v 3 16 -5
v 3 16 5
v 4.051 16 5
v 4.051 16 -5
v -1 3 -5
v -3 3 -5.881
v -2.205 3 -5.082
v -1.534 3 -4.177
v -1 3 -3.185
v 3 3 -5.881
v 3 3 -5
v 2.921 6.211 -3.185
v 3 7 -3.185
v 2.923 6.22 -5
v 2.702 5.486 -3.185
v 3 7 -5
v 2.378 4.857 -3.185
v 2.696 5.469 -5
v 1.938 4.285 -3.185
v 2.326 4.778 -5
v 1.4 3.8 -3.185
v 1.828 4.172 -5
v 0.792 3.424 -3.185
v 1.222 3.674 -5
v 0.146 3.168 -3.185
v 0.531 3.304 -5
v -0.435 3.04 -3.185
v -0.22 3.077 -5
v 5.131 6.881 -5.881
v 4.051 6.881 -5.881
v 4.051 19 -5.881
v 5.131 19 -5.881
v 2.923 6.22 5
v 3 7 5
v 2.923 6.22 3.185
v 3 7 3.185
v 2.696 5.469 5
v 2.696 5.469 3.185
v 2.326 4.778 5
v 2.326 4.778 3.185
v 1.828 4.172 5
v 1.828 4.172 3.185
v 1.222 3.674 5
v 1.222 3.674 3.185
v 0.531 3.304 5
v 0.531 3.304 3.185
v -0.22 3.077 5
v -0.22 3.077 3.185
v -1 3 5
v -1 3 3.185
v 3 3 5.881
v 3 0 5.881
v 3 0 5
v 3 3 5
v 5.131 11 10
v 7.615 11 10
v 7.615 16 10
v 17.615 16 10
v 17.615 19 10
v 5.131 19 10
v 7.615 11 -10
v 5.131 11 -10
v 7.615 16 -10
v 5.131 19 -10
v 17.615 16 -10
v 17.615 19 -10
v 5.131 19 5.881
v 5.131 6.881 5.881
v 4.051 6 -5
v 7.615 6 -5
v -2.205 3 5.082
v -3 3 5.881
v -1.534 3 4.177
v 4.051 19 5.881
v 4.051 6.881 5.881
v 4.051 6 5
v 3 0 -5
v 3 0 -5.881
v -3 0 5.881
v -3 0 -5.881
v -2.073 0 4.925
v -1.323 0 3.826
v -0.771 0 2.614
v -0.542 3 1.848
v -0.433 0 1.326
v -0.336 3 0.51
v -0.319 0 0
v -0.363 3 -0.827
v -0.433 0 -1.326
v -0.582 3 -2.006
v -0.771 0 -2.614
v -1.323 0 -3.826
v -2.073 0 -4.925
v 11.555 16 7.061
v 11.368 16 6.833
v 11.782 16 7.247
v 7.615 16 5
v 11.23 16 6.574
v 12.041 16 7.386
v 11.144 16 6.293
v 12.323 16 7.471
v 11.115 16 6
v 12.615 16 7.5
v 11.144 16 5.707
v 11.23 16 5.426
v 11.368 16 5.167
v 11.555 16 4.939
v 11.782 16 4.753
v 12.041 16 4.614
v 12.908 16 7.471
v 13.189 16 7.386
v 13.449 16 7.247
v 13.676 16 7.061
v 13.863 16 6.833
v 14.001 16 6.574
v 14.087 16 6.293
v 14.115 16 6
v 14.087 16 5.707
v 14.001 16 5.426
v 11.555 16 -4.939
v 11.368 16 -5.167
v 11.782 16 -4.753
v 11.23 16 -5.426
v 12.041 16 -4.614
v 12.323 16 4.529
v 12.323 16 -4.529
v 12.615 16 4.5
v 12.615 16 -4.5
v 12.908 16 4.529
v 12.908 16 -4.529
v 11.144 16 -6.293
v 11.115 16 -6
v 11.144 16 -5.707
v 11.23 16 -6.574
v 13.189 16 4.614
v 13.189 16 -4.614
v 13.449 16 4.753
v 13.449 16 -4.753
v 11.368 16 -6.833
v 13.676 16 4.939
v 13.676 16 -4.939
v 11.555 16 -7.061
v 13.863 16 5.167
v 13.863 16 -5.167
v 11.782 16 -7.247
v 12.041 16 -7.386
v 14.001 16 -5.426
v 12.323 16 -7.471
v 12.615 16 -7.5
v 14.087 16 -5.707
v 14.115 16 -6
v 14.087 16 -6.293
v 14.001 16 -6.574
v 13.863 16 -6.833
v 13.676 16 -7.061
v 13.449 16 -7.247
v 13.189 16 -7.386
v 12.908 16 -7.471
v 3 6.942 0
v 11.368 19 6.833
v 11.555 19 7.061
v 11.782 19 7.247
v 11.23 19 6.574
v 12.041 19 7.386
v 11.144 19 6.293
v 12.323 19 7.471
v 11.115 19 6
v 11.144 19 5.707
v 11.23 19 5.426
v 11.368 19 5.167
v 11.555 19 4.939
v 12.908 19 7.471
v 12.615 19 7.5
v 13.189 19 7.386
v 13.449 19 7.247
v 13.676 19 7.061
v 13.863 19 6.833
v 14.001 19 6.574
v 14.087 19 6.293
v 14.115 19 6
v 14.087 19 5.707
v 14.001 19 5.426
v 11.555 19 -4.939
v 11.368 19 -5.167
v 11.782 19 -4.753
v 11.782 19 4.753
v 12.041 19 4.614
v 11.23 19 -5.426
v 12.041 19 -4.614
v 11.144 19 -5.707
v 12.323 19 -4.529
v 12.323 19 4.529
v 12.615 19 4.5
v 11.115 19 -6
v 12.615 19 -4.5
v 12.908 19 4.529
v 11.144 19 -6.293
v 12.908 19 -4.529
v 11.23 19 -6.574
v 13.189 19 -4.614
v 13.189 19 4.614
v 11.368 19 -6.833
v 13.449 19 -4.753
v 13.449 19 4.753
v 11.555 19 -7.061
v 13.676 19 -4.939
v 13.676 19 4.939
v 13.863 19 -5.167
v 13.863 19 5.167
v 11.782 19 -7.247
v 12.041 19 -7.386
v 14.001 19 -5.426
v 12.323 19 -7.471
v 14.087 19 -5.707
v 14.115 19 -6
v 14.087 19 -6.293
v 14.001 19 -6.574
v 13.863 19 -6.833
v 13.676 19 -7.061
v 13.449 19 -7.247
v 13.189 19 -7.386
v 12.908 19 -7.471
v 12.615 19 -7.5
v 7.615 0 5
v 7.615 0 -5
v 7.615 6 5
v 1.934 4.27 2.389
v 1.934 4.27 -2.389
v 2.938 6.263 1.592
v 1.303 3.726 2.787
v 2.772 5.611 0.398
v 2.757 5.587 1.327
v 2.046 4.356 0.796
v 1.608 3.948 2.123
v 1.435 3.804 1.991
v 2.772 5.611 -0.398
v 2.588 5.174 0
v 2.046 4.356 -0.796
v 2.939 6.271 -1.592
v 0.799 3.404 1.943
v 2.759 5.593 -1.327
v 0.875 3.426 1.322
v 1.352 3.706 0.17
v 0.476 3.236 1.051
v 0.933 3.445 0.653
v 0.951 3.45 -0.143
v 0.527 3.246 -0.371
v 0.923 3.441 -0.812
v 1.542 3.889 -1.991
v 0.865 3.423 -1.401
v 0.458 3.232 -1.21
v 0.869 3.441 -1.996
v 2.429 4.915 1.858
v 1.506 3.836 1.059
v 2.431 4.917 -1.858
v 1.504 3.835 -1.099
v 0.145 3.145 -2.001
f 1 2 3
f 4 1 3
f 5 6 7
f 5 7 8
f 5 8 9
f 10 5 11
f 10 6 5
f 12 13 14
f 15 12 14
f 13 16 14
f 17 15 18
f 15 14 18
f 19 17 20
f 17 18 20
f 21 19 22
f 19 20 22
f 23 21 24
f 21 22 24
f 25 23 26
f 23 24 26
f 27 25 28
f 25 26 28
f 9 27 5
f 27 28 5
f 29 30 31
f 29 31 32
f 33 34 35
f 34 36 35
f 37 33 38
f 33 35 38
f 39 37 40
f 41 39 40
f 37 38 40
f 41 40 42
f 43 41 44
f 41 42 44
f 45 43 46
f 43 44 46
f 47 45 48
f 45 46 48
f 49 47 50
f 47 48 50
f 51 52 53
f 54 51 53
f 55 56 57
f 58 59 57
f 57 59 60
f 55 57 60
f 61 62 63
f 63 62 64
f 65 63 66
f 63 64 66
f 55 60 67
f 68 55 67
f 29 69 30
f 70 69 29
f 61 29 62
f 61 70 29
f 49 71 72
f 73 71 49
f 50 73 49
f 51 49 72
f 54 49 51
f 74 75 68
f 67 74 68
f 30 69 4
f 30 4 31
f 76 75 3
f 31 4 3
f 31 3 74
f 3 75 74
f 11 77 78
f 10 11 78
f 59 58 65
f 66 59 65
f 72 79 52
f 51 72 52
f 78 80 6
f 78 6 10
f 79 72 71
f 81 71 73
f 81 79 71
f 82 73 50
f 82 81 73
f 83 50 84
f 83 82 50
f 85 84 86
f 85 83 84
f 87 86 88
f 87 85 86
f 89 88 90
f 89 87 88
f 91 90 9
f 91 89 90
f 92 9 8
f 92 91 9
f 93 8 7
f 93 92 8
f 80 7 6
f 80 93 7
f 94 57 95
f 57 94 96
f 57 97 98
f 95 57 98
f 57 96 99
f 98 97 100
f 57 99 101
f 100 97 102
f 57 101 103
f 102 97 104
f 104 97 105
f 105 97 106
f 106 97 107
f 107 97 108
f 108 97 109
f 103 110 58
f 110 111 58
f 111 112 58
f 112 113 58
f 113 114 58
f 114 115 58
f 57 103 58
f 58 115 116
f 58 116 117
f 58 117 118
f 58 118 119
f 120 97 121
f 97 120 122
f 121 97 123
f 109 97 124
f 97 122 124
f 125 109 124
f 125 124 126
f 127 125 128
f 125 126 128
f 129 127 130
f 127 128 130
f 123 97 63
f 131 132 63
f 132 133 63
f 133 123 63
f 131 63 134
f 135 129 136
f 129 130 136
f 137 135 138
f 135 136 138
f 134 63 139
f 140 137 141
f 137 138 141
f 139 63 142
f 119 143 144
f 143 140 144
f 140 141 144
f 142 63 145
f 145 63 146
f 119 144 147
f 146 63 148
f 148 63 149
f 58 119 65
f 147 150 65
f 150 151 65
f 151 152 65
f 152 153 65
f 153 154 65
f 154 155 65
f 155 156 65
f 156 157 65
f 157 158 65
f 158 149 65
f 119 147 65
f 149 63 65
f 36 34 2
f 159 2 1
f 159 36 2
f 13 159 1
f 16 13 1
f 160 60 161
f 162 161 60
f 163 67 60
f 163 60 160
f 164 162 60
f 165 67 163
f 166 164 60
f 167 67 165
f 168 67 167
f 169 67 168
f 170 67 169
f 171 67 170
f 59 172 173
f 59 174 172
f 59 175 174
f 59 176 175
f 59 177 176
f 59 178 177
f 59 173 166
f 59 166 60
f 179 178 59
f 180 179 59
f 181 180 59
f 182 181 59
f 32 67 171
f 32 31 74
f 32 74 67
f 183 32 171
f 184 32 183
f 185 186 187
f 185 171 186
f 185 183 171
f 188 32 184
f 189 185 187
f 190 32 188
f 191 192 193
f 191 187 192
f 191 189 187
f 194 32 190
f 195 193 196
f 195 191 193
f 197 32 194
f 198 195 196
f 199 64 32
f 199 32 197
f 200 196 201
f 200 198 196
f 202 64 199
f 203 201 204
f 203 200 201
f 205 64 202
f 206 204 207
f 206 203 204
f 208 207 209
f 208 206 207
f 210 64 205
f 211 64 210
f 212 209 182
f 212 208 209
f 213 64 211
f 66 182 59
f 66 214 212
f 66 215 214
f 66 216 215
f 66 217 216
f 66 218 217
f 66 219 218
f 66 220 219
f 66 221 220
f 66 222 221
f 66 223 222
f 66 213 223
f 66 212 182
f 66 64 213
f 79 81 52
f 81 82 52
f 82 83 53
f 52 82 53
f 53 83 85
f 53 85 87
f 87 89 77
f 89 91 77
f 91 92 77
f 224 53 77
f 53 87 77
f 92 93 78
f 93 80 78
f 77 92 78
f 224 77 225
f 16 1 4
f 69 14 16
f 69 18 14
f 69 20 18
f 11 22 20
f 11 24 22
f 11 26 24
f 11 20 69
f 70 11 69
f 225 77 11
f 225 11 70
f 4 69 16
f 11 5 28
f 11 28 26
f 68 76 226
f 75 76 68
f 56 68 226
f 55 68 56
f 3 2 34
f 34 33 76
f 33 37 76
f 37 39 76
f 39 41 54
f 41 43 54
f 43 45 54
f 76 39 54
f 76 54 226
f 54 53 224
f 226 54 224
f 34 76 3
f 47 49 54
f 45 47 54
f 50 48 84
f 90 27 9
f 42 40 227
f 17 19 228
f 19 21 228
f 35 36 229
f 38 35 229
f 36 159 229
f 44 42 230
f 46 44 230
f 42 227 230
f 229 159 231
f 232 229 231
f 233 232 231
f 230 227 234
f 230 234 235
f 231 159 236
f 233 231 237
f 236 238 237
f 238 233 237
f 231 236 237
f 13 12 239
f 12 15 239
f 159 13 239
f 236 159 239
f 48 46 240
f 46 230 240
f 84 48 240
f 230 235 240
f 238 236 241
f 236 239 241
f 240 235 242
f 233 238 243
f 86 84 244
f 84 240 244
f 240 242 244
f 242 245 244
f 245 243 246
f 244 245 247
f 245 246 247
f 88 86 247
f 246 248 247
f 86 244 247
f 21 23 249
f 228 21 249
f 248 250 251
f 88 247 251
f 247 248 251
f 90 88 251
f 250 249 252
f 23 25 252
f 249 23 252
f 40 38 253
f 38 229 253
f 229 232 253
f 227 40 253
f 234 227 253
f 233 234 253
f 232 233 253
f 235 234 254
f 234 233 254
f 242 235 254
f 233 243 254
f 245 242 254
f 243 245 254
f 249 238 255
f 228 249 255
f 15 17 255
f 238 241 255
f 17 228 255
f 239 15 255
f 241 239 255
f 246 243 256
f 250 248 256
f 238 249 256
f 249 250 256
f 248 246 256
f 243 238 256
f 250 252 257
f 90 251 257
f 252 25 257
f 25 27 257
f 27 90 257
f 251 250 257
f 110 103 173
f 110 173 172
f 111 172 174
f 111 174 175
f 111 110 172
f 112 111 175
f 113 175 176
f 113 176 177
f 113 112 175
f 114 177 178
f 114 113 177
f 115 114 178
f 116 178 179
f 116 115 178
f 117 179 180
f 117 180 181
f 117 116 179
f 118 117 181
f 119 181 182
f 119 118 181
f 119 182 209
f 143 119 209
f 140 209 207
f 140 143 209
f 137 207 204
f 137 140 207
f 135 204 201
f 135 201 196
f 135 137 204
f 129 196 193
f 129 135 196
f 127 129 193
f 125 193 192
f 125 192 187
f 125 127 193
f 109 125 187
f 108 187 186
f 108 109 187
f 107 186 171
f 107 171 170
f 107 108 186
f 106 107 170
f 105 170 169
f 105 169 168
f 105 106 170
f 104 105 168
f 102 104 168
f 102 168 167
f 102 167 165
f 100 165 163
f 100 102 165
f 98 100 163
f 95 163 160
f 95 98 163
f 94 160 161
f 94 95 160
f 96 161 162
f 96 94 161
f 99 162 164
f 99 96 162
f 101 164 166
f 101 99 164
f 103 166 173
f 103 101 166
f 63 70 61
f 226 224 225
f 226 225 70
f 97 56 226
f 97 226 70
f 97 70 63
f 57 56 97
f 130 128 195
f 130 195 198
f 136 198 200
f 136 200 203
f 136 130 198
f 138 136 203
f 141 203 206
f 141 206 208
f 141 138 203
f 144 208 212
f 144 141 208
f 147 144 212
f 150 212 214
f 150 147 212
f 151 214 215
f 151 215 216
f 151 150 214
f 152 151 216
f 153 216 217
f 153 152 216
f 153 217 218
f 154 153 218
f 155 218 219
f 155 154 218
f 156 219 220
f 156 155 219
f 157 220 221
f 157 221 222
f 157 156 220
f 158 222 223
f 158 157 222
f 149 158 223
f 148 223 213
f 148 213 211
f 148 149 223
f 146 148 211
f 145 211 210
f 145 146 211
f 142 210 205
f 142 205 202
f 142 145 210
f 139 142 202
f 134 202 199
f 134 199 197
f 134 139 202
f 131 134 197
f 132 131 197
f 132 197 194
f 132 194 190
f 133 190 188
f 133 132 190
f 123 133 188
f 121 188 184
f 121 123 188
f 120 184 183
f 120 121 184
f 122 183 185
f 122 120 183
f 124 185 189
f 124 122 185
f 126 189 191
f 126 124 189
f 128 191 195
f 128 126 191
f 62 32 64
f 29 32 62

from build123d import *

# Parameters (mm, degrees)
SKETCH1_R               = 1.5
BOSS_EXTRUDE1_DEPTH     = 3
SKETCH3_W               = 4.615398666
SKETCH3_H               = 10
BOSS_EXTRUDE2_DEPTH     = 12.9997796
FILLET7_R               = 1
CUT_EXTRUDE4_DEPTH      = 10
SKETCH9_W               = 13.564457496
SKETCH9_H               = 20
SKETCH9_R               = 1.5
BOSS_EXTRUDE3_DEPTH     = 3
CHAMFER1_SIZE           = 10
CHAMFER2_SIZE           = 10
FILLET8_R               = 4
CUT_EXTRUDE5_DEPTH      = 27.355587635
CUT_EXTRUDE5_DEPTH_BACK = 27.355587635
SKETCH10_W              = 8.131195533
SKETCH10_H              = 6.749631571
SKETCH10_H_2            = 7.013496214


with BuildPart() as part:
    # Sketch1 → Boss-Extrude1 (new body)
    with BuildSketch(Plane(origin=(0, 0, 0), x_dir=(1, 0, 0), z_dir=(0, 1, 0))):
        Polygon((-3, -11.32792047), (3, -11.32792047), (3, -5), (7.615398666, -5), (7.615398666, 5), (3, 5), (3, 11.32792047), (-3, 11.32792047), align=None)
        with Locations(Location((0, 8.5, 0), (0, 0, 270))):
            Circle(SKETCH1_R, mode=Mode.SUBTRACT)
        with Locations(Location((0, -8.5, 0), (0, 0, 270))):
            Circle(SKETCH1_R, mode=Mode.SUBTRACT)
    extrude(amount=BOSS_EXTRUDE1_DEPTH)

    # Sketch3 → Boss-Extrude2 (add)
    with BuildSketch(Plane(origin=(0, 3, 0), x_dir=(1, 0, 0), z_dir=(0, 1, 0))):
        with Locations((5.307699333, 0)):
            Rectangle(SKETCH3_W, SKETCH3_H)
    extrude(amount=BOSS_EXTRUDE2_DEPTH)

    # Fillet7
    fillet7_edges = [part.edges().sort_by_distance(p)[0] for p in [
        (3, 1.5, 11.32792047),
        (3, 1.5, -11.32792047),
    ]]
    fillet(fillet7_edges, radius=FILLET7_R)

    # Sketch7 → Cut-Extrude4 (cut)
    with BuildSketch(Plane.XZ):
        with BuildLine():
            Line((-3.65526474, -6.392053518), (-3.78188192, 6.478485425))
            ThreePointArc((-3.78188192, 6.478485425), (-0.319780446, 0.076652438), (-3.65526474, -6.392053518))
        make_face()
    extrude(amount=-CUT_EXTRUDE4_DEPTH, mode=Mode.SUBTRACT)

    # Sketch9 → Boss-Extrude3 (add)
    with BuildSketch(Plane(origin=(0, 15.9997796, 0), x_dir=(1, 0, 0), z_dir=(0, 1, 0))):
        with Locations((10.833169918, 0)):
            Rectangle(SKETCH9_W, SKETCH9_H)
        with Locations(Location((12.615398666, 6, 0), (0, 0, 270))):
            Circle(SKETCH9_R, mode=Mode.SUBTRACT)
        with Locations(Location((12.615398666, -6, 0), (0, 0, 270))):
            Circle(SKETCH9_R, mode=Mode.SUBTRACT)
    extrude(amount=BOSS_EXTRUDE3_DEPTH)

    # Chamfer1
    # the kernel refuses this chamfer: 10 mm, written as the material it adds along each edge
    with BuildSketch(Plane(origin=(4.05094117, 15.9997796, 5), x_dir=(0, -0.9996219169112968, -0.027495876610586403), z_dir=(1, 0, 0))) as chamfer1_piece_1_section:
        Polygon((CHAMFER1_SIZE * 0.999621916911, -CHAMFER1_SIZE * 0.0274958766106), (-CHAMFER1_SIZE * 0.0274958766106, -CHAMFER1_SIZE * 0.999621916911), (0, 0), align=None)
    chamfer1_piece_1 = extrude(amount=3.564457497, mode=Mode.PRIVATE)
    chamfer1_piece_1 = split(chamfer1_piece_1, bisect_by=Plane(origin=(5.833169918, 12.110890711, 10), z_dir=(0, 0, -1)), keep=Keep.TOP, mode=Mode.PRIVATE)
    add(chamfer1_piece_1)

    # Chamfer2
    # the kernel refuses this chamfer: 10 mm, written as the material it adds along each edge
    with BuildSketch(Plane(origin=(7.615398666, 15.9997796, -5), x_dir=(0, -0.9996219169112968, 0.027495876610586403), z_dir=(-1, 0, 0))) as chamfer2_piece_1_section:
        Polygon((CHAMFER2_SIZE * 0.999621916911, -CHAMFER2_SIZE * 0.0274958766106), (-CHAMFER2_SIZE * 0.0274958766106, -CHAMFER2_SIZE * 0.999621916911), (0, 0), align=None)
    chamfer2_piece_1 = extrude(amount=3.564457497, mode=Mode.PRIVATE)
    chamfer2_piece_1 = split(chamfer2_piece_1, bisect_by=Plane(origin=(5.833169918, 12.110890711, -10), z_dir=(0, 0, 1)), keep=Keep.TOP, mode=Mode.PRIVATE)
    add(chamfer2_piece_1)

    # Fillet8
    fillet8_edges = [part.edges().sort_by_distance(p)[0] for p in [
        (3, 3, 0),
    ]]
    fillet(fillet8_edges, radius=FILLET8_R)

    # Sketch10 → Cut-Extrude5 (cut, two sides: drawn at the far end of the back side and taken through both)
    with BuildSketch(Plane(origin=(0, 3, 0), x_dir=(1, 0, 0), z_dir=(0, 1, 0)).offset(-CUT_EXTRUDE5_DEPTH_BACK)):
        with Locations((1.065597767, 9.256059268)):
            Rectangle(SKETCH10_W, SKETCH10_H)
        with Locations((1.065597767, -9.38799159)):
            Rectangle(SKETCH10_W, SKETCH10_H_2)
    extrude(amount=CUT_EXTRUDE5_DEPTH + CUT_EXTRUDE5_DEPTH_BACK, mode=Mode.SUBTRACT)


solid = part.part
